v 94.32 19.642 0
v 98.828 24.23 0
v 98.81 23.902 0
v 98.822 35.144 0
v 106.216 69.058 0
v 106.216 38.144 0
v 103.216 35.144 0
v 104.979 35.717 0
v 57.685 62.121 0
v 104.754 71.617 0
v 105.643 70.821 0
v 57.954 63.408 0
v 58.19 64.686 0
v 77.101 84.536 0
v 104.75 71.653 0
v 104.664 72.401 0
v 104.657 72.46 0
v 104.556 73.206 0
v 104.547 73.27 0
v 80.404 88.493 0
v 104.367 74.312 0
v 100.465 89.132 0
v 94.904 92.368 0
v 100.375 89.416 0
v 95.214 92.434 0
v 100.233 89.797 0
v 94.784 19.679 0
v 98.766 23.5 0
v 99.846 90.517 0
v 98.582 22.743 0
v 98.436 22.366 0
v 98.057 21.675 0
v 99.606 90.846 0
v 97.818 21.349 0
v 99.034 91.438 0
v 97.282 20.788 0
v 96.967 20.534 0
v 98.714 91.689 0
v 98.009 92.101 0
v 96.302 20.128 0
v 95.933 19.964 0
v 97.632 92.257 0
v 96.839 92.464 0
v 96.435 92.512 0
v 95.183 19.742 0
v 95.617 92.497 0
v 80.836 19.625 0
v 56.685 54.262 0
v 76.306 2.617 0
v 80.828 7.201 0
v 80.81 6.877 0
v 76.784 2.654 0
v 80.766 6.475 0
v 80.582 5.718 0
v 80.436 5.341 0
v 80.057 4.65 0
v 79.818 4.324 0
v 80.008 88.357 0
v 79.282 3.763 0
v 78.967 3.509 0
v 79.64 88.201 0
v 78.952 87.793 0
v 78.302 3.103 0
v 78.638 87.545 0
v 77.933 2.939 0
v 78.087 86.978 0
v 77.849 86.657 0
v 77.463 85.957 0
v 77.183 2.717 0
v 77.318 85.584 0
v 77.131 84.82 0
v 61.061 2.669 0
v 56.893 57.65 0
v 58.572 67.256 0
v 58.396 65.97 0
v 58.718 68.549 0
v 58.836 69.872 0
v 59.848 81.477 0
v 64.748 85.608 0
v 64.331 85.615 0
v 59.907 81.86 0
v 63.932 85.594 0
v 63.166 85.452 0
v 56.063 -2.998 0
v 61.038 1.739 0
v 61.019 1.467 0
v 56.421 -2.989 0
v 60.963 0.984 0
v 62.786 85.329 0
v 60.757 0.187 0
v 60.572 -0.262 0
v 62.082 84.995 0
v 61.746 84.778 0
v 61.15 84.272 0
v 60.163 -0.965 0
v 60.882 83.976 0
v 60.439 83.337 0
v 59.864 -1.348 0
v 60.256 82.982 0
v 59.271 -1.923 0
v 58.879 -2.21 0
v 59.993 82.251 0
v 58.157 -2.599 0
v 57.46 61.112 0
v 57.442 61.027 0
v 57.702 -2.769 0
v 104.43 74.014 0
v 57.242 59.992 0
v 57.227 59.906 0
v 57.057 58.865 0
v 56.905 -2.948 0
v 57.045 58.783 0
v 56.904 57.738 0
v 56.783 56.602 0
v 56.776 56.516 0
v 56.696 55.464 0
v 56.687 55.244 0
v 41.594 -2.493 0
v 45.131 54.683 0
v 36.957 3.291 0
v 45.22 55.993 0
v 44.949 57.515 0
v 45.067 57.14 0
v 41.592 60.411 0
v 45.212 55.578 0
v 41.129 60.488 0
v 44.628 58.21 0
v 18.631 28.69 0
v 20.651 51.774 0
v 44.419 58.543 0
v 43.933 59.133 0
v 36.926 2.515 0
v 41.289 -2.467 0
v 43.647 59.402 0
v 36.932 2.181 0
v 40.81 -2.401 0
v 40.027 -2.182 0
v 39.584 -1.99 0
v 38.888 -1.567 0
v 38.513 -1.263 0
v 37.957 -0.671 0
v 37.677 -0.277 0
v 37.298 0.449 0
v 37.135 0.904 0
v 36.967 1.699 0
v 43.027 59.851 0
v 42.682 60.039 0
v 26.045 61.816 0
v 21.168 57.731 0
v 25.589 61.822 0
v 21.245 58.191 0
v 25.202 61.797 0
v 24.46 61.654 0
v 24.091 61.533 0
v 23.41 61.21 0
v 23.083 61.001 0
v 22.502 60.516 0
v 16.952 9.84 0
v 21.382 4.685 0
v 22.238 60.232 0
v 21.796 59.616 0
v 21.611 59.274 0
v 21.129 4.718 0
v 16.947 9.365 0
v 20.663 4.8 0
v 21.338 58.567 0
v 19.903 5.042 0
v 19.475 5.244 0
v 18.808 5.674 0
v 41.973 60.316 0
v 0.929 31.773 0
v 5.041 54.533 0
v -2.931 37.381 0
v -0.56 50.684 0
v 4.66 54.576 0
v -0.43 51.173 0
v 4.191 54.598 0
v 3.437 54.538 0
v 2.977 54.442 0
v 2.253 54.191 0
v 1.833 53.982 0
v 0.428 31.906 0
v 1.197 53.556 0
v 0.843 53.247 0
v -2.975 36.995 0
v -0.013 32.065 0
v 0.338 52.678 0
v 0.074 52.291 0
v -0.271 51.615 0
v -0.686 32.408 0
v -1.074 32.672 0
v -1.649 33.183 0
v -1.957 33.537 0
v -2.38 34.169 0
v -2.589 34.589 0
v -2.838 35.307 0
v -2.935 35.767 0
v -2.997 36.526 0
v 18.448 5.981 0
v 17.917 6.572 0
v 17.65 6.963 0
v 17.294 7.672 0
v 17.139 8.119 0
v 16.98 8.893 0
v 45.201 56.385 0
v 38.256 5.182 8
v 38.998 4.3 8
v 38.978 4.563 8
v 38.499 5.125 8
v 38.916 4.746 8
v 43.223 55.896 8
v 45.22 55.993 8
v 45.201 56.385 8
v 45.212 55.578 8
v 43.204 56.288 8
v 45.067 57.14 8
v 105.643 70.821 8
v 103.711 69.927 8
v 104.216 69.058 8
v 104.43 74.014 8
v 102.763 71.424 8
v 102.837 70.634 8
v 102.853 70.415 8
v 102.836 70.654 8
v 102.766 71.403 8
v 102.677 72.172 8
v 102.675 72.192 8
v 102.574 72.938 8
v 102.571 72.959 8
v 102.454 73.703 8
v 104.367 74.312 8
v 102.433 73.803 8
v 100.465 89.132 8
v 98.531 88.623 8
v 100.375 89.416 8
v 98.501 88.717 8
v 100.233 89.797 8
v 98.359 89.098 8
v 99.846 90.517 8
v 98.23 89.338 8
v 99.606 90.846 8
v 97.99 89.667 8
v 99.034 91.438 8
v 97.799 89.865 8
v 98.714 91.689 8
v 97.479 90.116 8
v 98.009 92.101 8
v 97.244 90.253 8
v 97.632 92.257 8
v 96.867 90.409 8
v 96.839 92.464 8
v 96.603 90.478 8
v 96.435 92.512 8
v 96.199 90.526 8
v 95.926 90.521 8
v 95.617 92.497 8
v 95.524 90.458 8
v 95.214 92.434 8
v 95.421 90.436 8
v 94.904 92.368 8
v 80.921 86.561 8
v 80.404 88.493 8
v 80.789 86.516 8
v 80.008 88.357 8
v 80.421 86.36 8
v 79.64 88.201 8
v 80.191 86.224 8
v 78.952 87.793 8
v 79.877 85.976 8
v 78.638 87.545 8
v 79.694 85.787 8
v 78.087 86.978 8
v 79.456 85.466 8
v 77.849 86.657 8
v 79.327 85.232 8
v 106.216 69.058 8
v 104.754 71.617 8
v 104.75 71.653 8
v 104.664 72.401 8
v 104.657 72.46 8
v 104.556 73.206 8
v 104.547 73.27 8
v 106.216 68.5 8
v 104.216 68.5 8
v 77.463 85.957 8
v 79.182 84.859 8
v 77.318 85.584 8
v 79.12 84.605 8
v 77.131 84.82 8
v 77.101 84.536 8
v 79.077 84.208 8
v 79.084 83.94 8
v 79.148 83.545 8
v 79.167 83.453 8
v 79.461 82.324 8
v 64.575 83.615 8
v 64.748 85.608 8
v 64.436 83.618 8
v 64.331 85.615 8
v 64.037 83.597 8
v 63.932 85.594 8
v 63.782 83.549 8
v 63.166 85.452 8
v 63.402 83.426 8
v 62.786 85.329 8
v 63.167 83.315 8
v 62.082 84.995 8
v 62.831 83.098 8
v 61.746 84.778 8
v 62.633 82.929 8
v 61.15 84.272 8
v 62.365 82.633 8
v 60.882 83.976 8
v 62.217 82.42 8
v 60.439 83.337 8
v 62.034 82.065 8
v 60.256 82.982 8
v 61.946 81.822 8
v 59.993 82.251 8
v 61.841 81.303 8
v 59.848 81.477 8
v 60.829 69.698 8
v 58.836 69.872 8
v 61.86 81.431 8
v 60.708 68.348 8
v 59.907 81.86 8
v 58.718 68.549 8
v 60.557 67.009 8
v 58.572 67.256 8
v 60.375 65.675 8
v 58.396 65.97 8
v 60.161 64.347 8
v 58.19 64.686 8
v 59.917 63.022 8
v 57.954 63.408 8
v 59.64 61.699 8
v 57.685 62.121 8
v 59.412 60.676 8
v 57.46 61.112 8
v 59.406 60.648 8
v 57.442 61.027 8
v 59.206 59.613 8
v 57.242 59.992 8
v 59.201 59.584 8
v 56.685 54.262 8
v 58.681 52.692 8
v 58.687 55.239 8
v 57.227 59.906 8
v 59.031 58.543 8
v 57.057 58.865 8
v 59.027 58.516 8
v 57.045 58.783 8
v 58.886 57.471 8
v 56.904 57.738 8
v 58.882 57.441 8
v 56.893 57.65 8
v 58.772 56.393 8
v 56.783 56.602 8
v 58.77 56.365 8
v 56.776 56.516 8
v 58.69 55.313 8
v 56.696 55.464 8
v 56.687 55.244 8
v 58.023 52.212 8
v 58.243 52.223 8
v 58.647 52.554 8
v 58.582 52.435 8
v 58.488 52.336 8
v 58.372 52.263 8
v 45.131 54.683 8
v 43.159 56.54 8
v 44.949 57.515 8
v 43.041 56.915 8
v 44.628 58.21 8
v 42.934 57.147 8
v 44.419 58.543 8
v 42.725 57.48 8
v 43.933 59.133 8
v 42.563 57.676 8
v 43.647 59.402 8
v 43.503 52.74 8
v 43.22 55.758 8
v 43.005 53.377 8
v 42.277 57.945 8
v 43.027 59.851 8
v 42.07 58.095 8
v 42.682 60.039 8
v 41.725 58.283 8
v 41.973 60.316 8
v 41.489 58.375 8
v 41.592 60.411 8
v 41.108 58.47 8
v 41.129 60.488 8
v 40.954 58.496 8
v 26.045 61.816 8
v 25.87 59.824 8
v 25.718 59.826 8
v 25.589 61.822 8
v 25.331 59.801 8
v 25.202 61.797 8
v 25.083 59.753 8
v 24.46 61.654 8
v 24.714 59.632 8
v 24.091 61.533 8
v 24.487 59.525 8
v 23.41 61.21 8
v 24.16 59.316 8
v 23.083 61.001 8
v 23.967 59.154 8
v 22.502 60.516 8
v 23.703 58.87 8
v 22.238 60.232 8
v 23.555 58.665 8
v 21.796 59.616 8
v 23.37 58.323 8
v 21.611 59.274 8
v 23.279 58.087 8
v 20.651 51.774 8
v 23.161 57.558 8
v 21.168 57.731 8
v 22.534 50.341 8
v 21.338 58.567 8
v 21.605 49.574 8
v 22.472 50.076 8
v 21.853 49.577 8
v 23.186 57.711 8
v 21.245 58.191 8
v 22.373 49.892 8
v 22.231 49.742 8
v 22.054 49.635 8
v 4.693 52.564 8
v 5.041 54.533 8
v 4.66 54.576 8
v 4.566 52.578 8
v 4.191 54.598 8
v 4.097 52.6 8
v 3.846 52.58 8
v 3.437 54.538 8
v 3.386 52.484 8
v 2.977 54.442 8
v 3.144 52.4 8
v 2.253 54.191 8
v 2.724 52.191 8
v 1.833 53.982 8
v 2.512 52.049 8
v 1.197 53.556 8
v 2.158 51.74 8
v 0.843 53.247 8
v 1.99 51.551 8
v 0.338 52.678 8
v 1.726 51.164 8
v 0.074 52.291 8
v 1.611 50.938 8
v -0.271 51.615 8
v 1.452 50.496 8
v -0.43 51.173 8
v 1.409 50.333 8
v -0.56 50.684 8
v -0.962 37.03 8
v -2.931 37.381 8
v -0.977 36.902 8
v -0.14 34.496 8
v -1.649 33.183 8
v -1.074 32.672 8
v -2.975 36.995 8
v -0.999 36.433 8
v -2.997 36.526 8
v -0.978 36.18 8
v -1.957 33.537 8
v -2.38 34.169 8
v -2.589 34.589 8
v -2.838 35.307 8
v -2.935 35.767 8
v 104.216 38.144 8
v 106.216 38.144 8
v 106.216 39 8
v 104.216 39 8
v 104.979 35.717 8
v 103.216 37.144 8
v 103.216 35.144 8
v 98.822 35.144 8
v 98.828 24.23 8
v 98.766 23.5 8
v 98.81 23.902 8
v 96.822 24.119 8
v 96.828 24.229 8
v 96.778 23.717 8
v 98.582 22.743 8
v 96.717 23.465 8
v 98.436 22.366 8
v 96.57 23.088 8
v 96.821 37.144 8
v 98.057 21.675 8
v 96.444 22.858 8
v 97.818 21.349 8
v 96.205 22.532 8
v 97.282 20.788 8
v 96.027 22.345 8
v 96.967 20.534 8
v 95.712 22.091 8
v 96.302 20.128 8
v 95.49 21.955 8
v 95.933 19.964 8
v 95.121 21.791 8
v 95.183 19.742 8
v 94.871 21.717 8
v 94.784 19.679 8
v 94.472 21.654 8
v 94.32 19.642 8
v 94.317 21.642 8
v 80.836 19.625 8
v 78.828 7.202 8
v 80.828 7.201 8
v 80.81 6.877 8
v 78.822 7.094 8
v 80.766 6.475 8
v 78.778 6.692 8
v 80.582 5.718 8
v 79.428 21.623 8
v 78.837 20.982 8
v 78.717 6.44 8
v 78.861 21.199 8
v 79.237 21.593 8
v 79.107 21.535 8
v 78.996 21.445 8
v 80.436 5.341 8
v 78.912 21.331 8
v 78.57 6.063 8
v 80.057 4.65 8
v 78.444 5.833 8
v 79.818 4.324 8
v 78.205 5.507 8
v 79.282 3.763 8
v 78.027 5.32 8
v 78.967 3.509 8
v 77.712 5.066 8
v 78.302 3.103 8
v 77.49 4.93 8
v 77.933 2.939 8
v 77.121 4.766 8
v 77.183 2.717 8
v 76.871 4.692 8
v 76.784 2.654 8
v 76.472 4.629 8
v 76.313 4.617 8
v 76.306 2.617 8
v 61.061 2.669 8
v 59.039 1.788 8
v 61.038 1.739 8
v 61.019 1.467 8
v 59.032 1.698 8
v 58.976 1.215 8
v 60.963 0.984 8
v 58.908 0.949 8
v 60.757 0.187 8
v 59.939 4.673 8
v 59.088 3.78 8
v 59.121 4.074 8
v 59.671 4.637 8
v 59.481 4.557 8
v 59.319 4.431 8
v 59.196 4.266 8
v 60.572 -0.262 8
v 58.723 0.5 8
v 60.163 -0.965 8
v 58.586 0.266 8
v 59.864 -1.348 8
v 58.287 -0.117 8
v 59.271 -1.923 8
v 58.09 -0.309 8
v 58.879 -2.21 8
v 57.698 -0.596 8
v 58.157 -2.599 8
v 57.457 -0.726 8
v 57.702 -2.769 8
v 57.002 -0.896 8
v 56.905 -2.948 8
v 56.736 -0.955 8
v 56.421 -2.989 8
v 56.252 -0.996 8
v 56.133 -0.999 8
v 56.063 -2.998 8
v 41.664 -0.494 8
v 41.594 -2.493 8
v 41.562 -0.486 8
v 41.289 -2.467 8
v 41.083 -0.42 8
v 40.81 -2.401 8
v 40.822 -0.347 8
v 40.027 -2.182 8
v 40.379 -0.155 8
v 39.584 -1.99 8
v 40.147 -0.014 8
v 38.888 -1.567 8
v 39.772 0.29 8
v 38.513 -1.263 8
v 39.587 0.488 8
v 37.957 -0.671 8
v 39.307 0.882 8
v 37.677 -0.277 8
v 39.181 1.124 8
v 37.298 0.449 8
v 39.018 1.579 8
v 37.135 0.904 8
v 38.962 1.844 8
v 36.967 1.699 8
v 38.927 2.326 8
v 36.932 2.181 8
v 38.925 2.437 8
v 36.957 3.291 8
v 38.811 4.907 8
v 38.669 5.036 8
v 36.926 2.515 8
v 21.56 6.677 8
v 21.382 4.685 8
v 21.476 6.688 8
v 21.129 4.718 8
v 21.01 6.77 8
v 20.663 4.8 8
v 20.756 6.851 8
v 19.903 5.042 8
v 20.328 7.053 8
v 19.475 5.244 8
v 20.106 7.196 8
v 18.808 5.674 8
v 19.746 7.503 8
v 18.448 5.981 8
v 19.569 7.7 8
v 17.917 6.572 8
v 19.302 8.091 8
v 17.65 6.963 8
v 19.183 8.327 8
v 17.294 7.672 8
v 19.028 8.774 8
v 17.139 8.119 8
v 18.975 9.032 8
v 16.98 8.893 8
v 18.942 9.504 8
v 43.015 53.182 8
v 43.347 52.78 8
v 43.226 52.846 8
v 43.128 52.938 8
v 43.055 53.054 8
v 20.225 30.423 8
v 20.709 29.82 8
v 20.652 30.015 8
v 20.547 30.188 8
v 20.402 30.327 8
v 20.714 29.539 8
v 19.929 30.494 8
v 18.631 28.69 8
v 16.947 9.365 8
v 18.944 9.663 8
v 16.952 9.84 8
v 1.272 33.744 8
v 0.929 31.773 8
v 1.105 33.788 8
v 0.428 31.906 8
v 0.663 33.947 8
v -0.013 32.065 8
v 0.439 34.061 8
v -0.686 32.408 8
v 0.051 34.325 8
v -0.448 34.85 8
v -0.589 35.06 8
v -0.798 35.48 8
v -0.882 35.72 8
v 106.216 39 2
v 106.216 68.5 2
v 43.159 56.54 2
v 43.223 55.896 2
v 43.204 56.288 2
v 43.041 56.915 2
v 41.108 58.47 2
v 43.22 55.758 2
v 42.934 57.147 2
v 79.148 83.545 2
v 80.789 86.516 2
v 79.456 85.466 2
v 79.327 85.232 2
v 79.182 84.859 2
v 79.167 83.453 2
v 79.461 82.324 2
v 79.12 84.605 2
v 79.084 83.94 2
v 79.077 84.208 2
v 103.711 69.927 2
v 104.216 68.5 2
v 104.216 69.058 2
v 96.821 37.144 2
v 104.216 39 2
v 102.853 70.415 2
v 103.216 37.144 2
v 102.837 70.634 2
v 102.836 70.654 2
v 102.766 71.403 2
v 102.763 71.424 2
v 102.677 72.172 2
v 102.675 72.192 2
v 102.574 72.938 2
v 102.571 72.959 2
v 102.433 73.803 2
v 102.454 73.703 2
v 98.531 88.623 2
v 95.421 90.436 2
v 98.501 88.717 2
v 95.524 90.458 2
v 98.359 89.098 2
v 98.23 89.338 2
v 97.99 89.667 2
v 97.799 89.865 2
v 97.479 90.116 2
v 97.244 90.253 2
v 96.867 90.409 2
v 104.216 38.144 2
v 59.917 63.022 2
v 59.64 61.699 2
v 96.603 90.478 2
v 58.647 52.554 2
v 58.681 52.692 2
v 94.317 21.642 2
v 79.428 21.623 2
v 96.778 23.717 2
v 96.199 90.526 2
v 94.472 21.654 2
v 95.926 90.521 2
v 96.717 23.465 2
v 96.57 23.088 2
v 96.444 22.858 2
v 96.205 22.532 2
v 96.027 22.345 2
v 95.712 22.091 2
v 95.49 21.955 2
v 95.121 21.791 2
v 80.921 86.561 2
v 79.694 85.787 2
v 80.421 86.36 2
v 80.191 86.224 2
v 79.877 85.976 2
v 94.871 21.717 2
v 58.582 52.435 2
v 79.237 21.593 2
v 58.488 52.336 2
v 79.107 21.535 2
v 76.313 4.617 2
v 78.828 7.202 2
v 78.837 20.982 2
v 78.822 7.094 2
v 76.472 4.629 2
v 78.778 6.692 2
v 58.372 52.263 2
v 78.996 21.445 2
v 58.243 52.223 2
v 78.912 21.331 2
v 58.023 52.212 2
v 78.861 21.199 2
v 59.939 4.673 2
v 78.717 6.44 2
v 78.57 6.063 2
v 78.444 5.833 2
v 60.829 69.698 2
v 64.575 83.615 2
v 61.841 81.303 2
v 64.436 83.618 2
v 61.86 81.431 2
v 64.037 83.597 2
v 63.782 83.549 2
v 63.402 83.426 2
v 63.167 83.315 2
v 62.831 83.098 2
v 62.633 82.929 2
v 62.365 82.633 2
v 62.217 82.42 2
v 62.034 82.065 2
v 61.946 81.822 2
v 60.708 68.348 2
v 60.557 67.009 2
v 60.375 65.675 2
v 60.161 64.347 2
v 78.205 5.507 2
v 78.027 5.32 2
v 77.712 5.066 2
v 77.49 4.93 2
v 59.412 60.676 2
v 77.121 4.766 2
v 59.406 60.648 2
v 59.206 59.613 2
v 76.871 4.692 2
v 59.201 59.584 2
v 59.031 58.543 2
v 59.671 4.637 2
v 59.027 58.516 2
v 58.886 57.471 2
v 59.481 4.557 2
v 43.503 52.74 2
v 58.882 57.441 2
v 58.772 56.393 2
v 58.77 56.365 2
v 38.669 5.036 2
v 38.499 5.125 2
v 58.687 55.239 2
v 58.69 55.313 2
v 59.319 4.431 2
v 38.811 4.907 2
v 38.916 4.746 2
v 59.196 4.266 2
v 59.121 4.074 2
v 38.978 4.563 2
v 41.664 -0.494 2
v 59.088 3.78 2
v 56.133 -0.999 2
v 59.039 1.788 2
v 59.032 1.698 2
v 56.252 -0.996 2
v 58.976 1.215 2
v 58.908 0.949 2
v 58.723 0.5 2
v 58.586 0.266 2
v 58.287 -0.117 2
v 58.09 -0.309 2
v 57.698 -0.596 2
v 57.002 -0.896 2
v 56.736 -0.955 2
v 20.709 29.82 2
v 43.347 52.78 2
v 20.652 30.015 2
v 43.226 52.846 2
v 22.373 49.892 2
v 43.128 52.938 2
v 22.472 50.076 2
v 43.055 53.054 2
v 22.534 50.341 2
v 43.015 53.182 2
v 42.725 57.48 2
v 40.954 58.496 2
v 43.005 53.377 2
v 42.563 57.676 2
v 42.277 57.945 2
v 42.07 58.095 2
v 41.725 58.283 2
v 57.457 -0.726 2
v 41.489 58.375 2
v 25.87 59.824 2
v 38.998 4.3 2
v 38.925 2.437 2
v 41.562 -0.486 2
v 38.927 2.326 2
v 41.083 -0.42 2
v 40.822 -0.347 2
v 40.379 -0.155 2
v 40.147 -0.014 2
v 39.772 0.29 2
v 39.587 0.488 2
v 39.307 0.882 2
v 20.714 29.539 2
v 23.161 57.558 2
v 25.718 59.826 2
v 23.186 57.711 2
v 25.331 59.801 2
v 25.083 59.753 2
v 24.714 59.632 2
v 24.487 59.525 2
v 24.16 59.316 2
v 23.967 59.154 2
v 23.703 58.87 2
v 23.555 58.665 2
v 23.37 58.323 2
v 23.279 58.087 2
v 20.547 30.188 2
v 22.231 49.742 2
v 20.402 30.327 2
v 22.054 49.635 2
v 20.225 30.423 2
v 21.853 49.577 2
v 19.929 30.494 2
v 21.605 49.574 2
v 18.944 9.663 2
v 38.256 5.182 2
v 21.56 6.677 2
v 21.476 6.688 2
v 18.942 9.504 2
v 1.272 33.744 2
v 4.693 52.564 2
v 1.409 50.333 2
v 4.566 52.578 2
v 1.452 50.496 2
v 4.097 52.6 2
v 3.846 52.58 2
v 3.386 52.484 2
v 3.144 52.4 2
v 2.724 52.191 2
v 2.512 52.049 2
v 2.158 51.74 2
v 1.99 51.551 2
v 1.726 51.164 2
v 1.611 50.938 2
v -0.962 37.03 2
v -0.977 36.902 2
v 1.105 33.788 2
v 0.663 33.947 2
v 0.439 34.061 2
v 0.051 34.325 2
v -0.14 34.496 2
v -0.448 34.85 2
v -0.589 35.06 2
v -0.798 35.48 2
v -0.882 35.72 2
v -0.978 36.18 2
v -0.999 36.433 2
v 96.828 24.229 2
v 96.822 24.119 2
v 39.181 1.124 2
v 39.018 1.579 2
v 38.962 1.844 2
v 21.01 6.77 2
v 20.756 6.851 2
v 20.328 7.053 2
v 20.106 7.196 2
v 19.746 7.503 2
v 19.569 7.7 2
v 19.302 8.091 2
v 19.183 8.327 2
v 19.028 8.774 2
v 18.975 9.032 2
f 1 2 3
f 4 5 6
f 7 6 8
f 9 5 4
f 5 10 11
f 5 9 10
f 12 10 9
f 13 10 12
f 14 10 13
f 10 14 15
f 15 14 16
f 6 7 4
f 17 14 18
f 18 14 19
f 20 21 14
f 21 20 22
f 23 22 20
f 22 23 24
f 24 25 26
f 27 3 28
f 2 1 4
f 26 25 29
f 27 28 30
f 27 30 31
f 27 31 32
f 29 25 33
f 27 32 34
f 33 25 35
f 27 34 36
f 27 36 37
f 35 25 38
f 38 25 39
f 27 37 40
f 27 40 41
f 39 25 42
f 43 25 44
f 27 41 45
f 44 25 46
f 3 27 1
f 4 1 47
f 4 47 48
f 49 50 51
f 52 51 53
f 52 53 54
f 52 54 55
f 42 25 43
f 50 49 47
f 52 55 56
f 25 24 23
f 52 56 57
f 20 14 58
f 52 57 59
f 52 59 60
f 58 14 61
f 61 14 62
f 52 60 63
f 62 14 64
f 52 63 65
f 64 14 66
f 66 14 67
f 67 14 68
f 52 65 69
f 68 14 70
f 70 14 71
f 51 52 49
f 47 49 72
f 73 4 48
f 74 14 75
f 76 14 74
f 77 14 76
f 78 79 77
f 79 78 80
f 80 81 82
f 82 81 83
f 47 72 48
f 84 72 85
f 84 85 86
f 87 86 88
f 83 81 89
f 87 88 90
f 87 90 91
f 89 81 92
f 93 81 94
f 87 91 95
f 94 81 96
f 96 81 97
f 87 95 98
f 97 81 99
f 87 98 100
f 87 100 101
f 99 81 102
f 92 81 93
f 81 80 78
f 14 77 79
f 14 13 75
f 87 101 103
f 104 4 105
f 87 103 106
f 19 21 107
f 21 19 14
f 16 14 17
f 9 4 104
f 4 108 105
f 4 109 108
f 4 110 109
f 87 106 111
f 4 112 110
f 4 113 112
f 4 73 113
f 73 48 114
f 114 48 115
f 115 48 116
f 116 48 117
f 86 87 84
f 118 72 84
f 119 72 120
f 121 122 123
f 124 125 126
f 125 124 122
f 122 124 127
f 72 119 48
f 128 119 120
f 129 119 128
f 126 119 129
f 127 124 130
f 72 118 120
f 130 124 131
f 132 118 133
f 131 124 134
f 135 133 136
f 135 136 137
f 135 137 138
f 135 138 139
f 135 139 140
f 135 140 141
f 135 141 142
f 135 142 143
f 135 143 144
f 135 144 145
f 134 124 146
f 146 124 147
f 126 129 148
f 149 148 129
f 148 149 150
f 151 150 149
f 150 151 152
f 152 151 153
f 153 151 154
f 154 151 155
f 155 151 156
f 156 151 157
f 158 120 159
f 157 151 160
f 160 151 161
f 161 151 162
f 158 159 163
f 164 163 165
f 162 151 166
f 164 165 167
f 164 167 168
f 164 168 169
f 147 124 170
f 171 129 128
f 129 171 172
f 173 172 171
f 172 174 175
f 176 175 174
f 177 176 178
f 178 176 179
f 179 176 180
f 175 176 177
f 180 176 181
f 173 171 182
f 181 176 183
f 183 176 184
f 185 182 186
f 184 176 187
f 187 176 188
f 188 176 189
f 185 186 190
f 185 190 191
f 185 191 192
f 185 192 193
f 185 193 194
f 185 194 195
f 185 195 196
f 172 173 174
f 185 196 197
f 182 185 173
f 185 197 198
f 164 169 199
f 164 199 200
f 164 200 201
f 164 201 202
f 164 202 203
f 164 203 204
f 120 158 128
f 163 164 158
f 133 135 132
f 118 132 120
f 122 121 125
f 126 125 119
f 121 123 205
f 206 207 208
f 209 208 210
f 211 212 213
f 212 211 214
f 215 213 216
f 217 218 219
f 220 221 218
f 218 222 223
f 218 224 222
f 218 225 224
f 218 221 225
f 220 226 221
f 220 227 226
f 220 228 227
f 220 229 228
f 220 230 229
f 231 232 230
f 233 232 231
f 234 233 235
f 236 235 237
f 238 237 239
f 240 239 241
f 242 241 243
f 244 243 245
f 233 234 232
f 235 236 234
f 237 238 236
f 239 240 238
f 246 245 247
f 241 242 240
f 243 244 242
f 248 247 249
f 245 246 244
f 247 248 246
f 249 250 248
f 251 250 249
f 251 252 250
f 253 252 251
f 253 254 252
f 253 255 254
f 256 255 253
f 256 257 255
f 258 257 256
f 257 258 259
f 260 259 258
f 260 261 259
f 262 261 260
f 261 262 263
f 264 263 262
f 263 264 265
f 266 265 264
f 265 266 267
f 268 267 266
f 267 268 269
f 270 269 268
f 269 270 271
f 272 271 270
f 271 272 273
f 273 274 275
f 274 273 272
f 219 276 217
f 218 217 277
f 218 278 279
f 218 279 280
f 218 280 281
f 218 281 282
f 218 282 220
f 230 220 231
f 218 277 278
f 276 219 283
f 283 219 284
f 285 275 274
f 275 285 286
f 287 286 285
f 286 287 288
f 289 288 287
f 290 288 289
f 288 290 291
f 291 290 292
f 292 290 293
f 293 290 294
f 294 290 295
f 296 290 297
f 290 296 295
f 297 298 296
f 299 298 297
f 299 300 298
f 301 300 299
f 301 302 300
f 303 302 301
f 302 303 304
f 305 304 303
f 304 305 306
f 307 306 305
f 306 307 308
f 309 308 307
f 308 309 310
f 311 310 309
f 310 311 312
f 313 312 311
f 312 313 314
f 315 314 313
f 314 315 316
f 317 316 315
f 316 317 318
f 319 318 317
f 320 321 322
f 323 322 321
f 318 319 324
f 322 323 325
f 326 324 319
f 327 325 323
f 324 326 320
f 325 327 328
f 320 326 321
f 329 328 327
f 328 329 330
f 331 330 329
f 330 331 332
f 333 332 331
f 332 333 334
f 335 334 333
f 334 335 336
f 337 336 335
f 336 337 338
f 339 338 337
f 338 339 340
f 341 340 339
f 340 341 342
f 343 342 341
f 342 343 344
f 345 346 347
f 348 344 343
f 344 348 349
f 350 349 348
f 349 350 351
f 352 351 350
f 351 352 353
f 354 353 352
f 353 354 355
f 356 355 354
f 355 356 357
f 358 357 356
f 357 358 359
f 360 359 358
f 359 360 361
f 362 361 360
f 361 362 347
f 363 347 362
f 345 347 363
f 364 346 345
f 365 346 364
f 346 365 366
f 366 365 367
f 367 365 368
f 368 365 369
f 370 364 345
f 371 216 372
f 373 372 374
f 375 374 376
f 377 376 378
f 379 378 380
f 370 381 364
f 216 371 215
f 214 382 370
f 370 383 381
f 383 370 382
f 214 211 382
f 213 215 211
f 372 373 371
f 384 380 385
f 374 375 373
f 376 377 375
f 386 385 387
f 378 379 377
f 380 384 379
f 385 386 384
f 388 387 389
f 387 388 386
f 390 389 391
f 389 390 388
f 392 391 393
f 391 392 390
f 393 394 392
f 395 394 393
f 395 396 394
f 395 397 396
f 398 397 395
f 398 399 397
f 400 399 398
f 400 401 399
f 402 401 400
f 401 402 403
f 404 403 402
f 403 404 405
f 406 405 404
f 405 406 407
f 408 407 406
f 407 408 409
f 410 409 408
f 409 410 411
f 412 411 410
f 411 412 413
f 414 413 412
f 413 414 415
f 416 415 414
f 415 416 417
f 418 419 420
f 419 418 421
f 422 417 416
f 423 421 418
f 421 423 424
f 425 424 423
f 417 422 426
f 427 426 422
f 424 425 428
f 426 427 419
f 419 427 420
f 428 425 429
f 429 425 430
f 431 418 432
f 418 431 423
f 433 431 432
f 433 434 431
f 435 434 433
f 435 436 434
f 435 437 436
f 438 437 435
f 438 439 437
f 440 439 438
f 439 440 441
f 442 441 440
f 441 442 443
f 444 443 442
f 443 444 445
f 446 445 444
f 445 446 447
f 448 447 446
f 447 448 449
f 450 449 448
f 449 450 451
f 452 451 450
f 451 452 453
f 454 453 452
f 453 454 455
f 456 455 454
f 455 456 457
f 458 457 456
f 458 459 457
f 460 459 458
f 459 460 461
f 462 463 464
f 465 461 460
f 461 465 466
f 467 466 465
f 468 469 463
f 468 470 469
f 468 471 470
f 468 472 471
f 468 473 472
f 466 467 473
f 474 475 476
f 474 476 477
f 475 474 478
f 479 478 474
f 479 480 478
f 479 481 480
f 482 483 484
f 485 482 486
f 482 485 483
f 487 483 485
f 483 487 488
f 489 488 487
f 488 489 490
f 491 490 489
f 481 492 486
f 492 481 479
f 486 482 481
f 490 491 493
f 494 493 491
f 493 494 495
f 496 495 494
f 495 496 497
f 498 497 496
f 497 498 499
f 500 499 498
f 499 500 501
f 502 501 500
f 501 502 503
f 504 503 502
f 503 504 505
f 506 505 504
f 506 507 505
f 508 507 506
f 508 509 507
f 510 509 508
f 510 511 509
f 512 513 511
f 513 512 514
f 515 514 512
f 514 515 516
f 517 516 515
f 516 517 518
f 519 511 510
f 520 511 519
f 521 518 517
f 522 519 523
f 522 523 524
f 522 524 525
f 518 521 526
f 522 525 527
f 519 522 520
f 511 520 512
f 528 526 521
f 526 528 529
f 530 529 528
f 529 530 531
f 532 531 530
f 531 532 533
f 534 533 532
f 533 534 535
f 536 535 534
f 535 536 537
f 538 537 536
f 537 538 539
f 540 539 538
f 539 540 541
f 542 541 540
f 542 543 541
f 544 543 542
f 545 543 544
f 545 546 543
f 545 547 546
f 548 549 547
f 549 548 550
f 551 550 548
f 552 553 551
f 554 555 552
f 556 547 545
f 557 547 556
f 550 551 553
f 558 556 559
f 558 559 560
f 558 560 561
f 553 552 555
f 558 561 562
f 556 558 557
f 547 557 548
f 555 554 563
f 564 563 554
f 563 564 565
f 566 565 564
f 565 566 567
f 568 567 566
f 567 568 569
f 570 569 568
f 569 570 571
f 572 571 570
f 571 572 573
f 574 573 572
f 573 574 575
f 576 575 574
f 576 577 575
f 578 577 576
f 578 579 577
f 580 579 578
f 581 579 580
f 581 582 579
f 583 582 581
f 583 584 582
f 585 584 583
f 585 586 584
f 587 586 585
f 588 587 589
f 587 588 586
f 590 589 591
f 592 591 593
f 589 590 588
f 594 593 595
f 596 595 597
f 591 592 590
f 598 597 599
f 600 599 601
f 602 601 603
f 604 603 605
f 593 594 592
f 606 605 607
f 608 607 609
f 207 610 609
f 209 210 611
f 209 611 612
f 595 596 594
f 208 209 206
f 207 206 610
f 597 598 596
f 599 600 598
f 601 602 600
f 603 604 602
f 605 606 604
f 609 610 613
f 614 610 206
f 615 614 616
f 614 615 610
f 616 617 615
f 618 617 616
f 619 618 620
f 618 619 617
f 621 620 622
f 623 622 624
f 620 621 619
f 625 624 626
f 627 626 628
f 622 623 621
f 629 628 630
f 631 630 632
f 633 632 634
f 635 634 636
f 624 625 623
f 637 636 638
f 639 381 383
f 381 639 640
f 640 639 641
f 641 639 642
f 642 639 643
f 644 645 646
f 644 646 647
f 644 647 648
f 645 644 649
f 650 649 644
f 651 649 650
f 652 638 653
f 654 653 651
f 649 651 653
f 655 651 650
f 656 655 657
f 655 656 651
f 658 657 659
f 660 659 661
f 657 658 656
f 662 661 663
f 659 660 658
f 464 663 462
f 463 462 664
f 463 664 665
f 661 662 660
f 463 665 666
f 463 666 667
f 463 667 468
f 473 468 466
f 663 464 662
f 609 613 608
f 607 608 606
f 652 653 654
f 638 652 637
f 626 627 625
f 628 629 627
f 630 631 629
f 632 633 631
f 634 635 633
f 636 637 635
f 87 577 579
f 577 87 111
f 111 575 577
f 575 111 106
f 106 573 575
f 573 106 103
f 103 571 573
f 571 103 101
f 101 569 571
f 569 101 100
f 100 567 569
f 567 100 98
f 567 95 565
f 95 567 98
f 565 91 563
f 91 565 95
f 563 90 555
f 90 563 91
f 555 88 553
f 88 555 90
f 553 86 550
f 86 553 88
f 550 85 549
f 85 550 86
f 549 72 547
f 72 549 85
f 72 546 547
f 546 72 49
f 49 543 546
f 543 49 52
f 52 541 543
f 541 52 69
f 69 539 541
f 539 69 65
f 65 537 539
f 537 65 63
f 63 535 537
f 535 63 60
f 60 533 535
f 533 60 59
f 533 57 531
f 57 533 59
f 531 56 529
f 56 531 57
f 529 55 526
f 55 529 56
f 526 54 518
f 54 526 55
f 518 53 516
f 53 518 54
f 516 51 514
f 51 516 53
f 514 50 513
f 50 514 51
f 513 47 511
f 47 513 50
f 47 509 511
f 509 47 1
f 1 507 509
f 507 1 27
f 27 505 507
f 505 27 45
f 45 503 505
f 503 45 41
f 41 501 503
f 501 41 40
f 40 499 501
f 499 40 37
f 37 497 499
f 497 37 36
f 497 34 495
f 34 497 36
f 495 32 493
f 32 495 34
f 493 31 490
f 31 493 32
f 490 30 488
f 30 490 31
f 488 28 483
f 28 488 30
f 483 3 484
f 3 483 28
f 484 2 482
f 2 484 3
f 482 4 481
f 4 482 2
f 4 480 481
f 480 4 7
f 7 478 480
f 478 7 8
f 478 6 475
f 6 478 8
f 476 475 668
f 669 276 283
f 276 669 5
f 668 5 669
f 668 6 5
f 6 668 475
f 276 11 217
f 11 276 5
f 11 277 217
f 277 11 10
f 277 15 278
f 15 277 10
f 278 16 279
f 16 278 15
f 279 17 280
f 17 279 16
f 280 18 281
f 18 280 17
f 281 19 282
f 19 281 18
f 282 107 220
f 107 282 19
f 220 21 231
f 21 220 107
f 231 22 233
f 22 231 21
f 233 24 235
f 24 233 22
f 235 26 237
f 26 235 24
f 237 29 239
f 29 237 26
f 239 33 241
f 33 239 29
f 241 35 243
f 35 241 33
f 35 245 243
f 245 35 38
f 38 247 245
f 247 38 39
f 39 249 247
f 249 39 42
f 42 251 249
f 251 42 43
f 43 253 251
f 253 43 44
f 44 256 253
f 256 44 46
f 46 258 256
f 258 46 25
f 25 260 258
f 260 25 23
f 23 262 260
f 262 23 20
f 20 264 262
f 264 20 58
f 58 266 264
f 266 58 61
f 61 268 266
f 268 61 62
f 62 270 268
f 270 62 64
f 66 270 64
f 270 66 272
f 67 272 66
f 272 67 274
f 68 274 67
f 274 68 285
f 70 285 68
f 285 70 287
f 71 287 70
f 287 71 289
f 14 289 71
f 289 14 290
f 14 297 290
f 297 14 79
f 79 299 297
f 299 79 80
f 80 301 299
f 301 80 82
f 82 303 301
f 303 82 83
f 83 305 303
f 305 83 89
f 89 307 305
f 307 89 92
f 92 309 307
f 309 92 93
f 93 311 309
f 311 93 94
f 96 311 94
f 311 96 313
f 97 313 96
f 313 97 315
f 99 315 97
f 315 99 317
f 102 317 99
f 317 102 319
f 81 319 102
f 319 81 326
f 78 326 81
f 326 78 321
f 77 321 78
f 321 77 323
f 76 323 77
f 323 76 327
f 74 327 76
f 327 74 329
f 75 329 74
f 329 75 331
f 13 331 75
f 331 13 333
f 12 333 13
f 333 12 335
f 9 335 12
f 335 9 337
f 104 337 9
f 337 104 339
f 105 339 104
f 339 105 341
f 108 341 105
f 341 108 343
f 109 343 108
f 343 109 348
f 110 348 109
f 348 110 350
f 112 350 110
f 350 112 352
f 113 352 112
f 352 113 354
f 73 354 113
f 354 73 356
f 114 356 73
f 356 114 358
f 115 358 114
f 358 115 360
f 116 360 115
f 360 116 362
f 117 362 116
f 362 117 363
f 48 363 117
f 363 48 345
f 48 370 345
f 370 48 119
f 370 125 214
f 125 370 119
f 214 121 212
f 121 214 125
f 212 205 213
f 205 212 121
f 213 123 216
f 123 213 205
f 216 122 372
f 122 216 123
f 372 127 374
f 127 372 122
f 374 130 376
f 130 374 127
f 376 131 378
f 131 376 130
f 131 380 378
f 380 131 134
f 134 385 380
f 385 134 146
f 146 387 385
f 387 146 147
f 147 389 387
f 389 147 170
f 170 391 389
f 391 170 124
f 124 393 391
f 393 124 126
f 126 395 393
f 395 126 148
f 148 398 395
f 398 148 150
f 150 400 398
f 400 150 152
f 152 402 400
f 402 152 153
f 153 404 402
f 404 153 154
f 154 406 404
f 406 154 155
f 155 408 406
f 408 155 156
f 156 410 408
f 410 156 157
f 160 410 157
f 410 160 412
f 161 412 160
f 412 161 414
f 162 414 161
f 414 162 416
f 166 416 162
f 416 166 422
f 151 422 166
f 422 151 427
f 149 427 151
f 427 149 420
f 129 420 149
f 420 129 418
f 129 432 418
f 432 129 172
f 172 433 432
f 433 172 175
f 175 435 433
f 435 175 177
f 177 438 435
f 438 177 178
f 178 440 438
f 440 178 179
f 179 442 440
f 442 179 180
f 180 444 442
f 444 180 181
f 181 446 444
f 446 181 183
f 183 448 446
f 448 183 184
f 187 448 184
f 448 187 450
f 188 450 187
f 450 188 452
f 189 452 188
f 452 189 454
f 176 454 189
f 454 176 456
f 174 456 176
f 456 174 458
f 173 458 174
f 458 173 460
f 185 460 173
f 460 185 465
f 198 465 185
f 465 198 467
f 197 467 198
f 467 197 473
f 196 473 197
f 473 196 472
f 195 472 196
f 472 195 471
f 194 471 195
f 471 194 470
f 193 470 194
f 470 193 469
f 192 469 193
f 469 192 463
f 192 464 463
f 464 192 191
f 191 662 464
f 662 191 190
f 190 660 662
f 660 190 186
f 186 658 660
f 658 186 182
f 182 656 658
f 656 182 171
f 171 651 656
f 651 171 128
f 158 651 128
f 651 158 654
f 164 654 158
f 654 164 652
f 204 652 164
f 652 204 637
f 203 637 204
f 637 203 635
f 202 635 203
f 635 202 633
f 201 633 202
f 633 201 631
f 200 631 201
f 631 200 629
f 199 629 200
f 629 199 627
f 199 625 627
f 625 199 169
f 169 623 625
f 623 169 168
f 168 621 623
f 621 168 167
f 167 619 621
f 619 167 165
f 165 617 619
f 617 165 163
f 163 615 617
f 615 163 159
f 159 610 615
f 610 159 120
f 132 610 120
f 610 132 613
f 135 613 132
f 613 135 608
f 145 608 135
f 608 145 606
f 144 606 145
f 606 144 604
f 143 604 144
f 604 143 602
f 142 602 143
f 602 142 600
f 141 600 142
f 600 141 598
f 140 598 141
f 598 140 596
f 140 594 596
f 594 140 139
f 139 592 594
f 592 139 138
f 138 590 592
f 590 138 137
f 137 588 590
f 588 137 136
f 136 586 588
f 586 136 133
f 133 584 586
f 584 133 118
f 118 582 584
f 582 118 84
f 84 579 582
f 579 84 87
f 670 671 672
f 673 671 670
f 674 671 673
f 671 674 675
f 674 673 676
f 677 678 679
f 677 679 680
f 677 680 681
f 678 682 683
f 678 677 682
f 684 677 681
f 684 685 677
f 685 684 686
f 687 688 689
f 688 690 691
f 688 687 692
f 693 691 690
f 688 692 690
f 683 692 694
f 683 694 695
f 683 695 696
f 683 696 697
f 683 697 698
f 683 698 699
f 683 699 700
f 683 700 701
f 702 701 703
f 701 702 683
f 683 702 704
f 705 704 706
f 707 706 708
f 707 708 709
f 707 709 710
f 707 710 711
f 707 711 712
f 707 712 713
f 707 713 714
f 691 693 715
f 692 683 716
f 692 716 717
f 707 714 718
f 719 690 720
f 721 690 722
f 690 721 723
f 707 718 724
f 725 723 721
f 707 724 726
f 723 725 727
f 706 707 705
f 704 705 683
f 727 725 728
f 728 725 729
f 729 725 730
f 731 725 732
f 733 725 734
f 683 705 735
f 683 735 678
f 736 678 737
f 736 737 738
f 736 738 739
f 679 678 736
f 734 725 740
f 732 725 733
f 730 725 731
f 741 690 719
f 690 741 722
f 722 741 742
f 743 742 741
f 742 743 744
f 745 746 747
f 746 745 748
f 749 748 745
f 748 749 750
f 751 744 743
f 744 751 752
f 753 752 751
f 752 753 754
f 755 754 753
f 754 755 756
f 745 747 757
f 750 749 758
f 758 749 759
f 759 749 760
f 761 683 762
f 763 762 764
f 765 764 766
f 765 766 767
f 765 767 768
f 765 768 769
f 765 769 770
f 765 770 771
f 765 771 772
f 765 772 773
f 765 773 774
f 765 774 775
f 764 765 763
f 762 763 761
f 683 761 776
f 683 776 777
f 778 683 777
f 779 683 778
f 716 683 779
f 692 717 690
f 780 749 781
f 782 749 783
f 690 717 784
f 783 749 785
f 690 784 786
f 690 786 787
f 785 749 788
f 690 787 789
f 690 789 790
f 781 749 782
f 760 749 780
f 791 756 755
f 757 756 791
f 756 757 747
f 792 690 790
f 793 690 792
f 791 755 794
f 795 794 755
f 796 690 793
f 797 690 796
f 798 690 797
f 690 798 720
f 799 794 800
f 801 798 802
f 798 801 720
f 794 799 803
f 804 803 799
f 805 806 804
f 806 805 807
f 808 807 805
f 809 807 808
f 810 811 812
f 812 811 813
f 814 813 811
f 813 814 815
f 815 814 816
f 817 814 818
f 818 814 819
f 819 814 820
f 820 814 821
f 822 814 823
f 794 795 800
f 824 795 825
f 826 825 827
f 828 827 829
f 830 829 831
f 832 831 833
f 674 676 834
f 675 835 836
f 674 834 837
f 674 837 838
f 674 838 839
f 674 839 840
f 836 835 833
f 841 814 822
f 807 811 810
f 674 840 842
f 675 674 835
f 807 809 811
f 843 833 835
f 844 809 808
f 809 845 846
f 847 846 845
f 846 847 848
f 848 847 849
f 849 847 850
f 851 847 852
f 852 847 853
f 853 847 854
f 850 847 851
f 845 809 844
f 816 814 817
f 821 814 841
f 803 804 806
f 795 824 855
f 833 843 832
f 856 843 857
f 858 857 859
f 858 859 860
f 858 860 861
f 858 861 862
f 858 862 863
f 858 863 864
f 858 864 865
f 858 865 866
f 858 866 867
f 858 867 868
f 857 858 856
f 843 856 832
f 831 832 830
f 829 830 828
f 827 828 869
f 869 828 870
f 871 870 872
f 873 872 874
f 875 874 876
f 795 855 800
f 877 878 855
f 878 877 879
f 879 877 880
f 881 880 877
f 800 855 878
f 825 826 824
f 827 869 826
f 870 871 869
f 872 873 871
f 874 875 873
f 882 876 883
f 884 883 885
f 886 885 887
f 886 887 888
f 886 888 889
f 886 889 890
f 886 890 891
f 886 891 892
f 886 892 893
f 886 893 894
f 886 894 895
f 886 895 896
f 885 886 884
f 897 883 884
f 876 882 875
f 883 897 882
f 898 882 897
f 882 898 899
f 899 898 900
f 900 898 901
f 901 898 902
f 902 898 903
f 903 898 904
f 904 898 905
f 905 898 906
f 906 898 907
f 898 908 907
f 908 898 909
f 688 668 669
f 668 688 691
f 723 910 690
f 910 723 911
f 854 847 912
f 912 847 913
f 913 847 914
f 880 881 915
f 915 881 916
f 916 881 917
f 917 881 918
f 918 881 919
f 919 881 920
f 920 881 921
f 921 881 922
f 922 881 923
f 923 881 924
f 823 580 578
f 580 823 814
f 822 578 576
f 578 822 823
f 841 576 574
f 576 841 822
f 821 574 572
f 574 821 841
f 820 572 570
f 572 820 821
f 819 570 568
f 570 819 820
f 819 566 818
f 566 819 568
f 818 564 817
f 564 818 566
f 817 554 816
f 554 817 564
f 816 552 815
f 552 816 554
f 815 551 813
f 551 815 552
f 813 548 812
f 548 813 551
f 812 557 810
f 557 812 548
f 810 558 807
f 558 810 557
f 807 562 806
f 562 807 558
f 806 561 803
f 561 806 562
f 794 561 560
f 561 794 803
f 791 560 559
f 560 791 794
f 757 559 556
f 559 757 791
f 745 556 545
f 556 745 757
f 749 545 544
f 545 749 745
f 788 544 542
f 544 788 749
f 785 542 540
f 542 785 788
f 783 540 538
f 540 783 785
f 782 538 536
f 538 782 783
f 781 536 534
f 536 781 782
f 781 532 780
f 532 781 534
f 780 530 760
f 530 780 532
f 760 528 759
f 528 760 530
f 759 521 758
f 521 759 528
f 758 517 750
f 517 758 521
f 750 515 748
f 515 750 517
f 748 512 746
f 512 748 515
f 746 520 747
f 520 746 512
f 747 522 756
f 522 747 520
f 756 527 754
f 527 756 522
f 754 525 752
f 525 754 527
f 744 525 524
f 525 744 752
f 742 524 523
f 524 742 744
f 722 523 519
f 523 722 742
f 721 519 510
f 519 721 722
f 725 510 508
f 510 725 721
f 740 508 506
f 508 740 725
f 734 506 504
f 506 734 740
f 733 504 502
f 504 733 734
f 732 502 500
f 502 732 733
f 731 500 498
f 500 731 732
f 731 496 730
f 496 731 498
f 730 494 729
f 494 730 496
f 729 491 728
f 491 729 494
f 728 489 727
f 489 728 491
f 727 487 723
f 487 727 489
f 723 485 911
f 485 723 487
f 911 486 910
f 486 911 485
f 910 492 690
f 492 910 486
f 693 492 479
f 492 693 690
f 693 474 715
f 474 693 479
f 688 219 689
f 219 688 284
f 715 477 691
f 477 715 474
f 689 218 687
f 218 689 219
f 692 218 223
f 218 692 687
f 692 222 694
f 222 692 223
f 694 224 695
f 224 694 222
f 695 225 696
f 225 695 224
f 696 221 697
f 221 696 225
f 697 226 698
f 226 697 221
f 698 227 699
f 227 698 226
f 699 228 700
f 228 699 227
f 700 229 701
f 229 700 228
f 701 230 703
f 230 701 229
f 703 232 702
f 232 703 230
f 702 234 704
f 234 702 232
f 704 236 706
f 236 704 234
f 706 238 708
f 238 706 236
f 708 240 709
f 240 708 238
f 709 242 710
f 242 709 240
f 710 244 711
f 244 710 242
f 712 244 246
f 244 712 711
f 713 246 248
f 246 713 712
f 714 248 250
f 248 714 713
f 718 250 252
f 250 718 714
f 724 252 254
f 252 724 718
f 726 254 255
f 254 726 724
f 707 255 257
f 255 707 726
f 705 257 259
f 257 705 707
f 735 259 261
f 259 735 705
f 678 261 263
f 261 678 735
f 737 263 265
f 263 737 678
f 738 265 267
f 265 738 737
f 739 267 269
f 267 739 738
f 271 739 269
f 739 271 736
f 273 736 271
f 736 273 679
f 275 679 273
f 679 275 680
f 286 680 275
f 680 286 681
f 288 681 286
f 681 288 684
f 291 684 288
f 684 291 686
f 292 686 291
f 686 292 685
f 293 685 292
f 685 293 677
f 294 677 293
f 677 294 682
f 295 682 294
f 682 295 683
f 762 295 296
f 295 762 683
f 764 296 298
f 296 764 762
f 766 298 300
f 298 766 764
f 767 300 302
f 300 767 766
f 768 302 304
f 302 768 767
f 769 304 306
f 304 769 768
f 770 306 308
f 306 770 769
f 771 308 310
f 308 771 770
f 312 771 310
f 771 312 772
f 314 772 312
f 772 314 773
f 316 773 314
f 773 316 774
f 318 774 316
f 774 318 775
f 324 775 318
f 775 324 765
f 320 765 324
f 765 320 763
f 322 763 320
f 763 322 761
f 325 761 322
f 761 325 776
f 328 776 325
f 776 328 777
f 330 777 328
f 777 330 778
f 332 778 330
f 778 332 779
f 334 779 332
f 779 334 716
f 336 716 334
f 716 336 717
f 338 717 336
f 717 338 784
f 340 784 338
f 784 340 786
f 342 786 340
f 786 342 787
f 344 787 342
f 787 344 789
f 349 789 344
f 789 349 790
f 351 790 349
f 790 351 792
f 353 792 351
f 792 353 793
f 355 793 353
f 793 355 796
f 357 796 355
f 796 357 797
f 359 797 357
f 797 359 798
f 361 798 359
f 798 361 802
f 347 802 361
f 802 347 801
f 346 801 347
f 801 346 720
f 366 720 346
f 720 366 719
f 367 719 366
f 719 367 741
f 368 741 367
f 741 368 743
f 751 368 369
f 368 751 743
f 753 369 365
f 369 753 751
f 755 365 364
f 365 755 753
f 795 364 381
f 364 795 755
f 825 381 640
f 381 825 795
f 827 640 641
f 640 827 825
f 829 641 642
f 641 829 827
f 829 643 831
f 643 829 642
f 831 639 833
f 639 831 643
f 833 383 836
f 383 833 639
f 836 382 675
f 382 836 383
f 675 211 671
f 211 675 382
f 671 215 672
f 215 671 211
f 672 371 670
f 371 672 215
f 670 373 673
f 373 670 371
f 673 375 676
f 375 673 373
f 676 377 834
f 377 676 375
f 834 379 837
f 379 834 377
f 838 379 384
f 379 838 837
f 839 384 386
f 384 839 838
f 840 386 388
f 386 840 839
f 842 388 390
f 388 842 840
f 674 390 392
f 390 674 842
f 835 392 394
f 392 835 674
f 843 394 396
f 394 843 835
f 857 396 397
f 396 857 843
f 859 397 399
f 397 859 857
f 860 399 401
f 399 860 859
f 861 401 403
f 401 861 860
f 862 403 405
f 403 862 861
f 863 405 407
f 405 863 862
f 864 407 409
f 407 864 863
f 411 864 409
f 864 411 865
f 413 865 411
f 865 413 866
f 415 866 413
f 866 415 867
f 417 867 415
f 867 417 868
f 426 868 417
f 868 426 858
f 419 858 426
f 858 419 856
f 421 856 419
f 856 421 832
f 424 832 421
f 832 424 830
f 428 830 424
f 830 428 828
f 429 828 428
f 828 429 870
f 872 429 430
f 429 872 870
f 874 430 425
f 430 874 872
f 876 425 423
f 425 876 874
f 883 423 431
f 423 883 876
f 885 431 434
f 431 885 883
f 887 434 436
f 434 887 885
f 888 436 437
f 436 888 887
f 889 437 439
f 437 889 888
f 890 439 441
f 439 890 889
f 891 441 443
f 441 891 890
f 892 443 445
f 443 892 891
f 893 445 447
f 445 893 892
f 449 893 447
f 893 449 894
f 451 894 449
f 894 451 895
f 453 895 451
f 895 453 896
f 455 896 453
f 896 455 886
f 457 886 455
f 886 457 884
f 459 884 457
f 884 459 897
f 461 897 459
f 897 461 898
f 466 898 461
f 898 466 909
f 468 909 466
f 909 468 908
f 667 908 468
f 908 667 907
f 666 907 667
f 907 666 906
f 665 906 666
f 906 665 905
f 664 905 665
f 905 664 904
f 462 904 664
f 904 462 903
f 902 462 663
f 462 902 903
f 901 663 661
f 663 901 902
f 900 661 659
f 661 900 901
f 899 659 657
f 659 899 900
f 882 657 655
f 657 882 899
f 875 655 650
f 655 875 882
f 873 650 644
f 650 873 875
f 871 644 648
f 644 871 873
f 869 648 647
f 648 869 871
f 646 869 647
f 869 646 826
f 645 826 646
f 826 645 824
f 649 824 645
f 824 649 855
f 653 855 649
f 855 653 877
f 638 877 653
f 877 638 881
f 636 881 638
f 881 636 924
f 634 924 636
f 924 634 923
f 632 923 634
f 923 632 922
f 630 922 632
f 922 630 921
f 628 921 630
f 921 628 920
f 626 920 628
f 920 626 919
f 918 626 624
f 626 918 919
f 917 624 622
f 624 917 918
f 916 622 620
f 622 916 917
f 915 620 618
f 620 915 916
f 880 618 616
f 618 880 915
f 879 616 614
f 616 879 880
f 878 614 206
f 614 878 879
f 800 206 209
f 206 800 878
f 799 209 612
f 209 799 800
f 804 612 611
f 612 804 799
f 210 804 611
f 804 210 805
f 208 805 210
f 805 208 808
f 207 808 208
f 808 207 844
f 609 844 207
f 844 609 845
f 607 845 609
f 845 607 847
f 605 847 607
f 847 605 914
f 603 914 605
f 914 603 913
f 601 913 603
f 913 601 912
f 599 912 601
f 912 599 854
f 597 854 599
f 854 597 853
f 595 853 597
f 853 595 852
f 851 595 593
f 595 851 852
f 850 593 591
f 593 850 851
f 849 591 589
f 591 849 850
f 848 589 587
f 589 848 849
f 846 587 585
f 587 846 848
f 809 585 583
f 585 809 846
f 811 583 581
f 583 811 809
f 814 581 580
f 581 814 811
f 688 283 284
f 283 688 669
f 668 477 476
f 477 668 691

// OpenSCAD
// file: ../common.scad
// Smallcat Keyboard Case - Common Parameters and Modules
// Shared code for all case variants

// Parameters
wall_thickness = 2;        // Wall thickness in mm
case_depth = 8;            // Total case depth in mm
pcb_thickness = 1.6;       // PCB thickness in mm
pcb_clearance = 1;         // Clearance around PCB in mm
bottom_thickness = 2;      // Bottom plate thickness in mm

// Main case module - takes PCB outline, cutout passed as children()
module case_bottom(pcb_outline) {
    difference() {
        // Outer shell
        linear_extrude(height=case_depth)
            offset(r=wall_thickness + pcb_clearance)
                polygon(pcb_outline);

        // Inner cavity for PCB
        translate([0, 0, bottom_thickness])
            linear_extrude(height=case_depth)
                offset(r=pcb_clearance)
                    polygon(pcb_outline);

        // Cutout geometry passed as children
        children();
    }
}
// file: common.scad
// Smallcat Split Keyboard Case - Common Parameters and Modules
// Shared code for split case variants

include <../common.scad>

// Connector edge cutout parameters
connector_cutout_start = 39;   // Y start position
connector_cutout_end = 68.5;   // Y end position

// PCB dimensions
pcb_max_x = 103.216;

// Mirror points across X axis
function mirror_x(points, max_x) = [for (p = points) [max_x - p[0], p[1]]];

// Left half PCB outline (right half is mirrored from this)
left_pcb_outline = [
    [103.194, 36.855],
    [103.216, 36.386],
    [103.119, 35.926],
    [102.910, 35.506],
    [102.602, 35.152],
    [102.214, 34.888],
    [101.772, 34.729],
    [83.084, 31.474],
    [82.630, 31.365],
    [82.219, 31.142],
    [81.882, 30.819],
    [81.640, 30.420],
    [81.510, 29.971],
    [81.501, 29.504],
    [83.276, 9.574],
    [83.243, 9.102],
    [83.088, 8.655],
    [82.821, 8.264],
    [82.461, 7.957],
    [82.033, 7.755],
    [81.567, 7.673],
    [64.800, 6.172],
    [64.365, 6.070],
    [63.969, 5.862],
    [63.638, 5.561],
    [63.393, 5.187],
    [63.250, 4.763],
    [63.217, 4.317],
    [63.292, 2.398],
    [63.257, 1.916],
    [63.094, 1.461],
    [62.814, 1.067],
    [62.439, 0.763],
    [61.996, 0.571],
    [61.517, 0.505],
    [47.048, 0.000],
    [46.564, 0.041],
    [46.109, 0.211],
    [45.717, 0.498],
    [45.418, 0.881],
    [45.233, 1.330],
    [45.177, 1.813],
    [45.127, 3.848],
    [45.074, 4.318],
    [44.901, 4.757],
    [44.618, 5.136],
    [44.246, 5.427],
    [43.810, 5.610],
    [43.342, 5.673],
    [26.900, 5.617],
    [26.501, 5.680],
    [26.132, 5.844],
    [25.817, 6.098],
    [25.578, 6.424],
    [25.432, 6.801],
    [25.388, 7.203],
    [25.379, 21.037],
    [25.335, 21.439],
    [25.188, 21.816],
    [24.950, 22.142],
    [24.635, 22.395],
    [24.266, 22.560],
    [23.867, 22.623],
    [8.900, 22.642],
    [8.501, 22.705],
    [8.132, 22.869],
    [7.817, 23.123],
    [7.578, 23.449],
    [7.432, 23.826],
    [7.388, 24.228],
    [7.396, 38.144],
    [0.000, 38.144],
    [0.000, 69.058],
    [1.321, 69.810],
    [1.376, 70.561],
    [1.446, 71.310],
    [1.532, 72.058],
    [1.633, 72.804],
    [1.750, 73.548],
    [5.652, 88.368],
    [5.794, 88.749],
    [6.034, 89.078],
    [6.354, 89.329],
    [6.731, 89.485],
    [7.135, 89.533],
    [7.537, 89.470],
    [22.037, 85.595],
    [22.405, 85.439],
    [22.719, 85.191],
    [22.957, 84.870],
    [23.102, 84.497],
    [23.145, 84.100],
    [23.081, 83.705],
    [22.431, 81.205],
    [38.727, 82.619],
    [39.126, 82.598],
    [39.506, 82.475],
    [39.842, 82.258],
    [40.110, 81.962],
    [40.293, 81.607],
    [40.379, 81.216],
    [41.391, 69.611],
    [41.513, 68.247],
    [41.667, 66.885],
    [41.852, 65.528],
    [42.070, 64.176],
    [42.318, 62.829],
    [42.598, 61.488],
    [42.828, 60.458],
    [43.028, 59.423],
    [43.198, 58.382],
    [43.339, 57.337],
    [43.449, 56.289],
    [43.529, 55.237],
    [43.535, 52.568],
    [43.630, 52.187],
    [43.819, 51.842],
    [44.088, 51.557],
    [44.421, 51.348],
    [44.795, 51.230],
    [45.187, 51.211],
    [59.855, 51.745],
    [60.236, 51.841],
    [60.581, 52.029],
    [60.867, 52.298],
    [61.076, 52.631],
    [61.194, 53.005],
    [61.213, 53.398],
    [60.992, 55.848],
    [61.011, 56.240],
    [61.129, 56.615],
    [61.338, 56.948],
    [61.624, 57.217],
    [61.969, 57.405],
    [62.350, 57.500],
    [77.434, 58.828],
    [77.821, 58.803],
    [78.190, 58.682],
    [78.517, 58.473],
    [78.781, 58.189],
    [78.966, 57.847],
    [79.059, 57.471],
    [79.692, 50.183],
    [79.800, 49.720],
    [80.025, 49.301],
    [80.352, 48.956],
    [80.759, 48.710],
    [81.216, 48.579],
    [81.692, 48.573],
    [98.697, 51.579],
    [99.166, 51.601],
    [99.626, 51.505],
    [100.046, 51.296],
    [100.400, 50.987],
    [100.664, 50.600],
    [100.823, 50.158]
];

// Connector edge cutout module (clears entire inner edge section for USB + TRRS)
module connector_cutout(x_pos) {
    cutout_length = connector_cutout_end - connector_cutout_start;
    translate([x_pos, connector_cutout_start, bottom_thickness])
        cube([wall_thickness + 10, cutout_length, case_depth]);
}
// main file
// Smallcat Split Keyboard Case - Right Half
// Tray-style case design

include <common.scad>

case_bottom(mirror_x(left_pcb_outline, pcb_max_x)) {
    connector_cutout(pcb_max_x - 5);
}
